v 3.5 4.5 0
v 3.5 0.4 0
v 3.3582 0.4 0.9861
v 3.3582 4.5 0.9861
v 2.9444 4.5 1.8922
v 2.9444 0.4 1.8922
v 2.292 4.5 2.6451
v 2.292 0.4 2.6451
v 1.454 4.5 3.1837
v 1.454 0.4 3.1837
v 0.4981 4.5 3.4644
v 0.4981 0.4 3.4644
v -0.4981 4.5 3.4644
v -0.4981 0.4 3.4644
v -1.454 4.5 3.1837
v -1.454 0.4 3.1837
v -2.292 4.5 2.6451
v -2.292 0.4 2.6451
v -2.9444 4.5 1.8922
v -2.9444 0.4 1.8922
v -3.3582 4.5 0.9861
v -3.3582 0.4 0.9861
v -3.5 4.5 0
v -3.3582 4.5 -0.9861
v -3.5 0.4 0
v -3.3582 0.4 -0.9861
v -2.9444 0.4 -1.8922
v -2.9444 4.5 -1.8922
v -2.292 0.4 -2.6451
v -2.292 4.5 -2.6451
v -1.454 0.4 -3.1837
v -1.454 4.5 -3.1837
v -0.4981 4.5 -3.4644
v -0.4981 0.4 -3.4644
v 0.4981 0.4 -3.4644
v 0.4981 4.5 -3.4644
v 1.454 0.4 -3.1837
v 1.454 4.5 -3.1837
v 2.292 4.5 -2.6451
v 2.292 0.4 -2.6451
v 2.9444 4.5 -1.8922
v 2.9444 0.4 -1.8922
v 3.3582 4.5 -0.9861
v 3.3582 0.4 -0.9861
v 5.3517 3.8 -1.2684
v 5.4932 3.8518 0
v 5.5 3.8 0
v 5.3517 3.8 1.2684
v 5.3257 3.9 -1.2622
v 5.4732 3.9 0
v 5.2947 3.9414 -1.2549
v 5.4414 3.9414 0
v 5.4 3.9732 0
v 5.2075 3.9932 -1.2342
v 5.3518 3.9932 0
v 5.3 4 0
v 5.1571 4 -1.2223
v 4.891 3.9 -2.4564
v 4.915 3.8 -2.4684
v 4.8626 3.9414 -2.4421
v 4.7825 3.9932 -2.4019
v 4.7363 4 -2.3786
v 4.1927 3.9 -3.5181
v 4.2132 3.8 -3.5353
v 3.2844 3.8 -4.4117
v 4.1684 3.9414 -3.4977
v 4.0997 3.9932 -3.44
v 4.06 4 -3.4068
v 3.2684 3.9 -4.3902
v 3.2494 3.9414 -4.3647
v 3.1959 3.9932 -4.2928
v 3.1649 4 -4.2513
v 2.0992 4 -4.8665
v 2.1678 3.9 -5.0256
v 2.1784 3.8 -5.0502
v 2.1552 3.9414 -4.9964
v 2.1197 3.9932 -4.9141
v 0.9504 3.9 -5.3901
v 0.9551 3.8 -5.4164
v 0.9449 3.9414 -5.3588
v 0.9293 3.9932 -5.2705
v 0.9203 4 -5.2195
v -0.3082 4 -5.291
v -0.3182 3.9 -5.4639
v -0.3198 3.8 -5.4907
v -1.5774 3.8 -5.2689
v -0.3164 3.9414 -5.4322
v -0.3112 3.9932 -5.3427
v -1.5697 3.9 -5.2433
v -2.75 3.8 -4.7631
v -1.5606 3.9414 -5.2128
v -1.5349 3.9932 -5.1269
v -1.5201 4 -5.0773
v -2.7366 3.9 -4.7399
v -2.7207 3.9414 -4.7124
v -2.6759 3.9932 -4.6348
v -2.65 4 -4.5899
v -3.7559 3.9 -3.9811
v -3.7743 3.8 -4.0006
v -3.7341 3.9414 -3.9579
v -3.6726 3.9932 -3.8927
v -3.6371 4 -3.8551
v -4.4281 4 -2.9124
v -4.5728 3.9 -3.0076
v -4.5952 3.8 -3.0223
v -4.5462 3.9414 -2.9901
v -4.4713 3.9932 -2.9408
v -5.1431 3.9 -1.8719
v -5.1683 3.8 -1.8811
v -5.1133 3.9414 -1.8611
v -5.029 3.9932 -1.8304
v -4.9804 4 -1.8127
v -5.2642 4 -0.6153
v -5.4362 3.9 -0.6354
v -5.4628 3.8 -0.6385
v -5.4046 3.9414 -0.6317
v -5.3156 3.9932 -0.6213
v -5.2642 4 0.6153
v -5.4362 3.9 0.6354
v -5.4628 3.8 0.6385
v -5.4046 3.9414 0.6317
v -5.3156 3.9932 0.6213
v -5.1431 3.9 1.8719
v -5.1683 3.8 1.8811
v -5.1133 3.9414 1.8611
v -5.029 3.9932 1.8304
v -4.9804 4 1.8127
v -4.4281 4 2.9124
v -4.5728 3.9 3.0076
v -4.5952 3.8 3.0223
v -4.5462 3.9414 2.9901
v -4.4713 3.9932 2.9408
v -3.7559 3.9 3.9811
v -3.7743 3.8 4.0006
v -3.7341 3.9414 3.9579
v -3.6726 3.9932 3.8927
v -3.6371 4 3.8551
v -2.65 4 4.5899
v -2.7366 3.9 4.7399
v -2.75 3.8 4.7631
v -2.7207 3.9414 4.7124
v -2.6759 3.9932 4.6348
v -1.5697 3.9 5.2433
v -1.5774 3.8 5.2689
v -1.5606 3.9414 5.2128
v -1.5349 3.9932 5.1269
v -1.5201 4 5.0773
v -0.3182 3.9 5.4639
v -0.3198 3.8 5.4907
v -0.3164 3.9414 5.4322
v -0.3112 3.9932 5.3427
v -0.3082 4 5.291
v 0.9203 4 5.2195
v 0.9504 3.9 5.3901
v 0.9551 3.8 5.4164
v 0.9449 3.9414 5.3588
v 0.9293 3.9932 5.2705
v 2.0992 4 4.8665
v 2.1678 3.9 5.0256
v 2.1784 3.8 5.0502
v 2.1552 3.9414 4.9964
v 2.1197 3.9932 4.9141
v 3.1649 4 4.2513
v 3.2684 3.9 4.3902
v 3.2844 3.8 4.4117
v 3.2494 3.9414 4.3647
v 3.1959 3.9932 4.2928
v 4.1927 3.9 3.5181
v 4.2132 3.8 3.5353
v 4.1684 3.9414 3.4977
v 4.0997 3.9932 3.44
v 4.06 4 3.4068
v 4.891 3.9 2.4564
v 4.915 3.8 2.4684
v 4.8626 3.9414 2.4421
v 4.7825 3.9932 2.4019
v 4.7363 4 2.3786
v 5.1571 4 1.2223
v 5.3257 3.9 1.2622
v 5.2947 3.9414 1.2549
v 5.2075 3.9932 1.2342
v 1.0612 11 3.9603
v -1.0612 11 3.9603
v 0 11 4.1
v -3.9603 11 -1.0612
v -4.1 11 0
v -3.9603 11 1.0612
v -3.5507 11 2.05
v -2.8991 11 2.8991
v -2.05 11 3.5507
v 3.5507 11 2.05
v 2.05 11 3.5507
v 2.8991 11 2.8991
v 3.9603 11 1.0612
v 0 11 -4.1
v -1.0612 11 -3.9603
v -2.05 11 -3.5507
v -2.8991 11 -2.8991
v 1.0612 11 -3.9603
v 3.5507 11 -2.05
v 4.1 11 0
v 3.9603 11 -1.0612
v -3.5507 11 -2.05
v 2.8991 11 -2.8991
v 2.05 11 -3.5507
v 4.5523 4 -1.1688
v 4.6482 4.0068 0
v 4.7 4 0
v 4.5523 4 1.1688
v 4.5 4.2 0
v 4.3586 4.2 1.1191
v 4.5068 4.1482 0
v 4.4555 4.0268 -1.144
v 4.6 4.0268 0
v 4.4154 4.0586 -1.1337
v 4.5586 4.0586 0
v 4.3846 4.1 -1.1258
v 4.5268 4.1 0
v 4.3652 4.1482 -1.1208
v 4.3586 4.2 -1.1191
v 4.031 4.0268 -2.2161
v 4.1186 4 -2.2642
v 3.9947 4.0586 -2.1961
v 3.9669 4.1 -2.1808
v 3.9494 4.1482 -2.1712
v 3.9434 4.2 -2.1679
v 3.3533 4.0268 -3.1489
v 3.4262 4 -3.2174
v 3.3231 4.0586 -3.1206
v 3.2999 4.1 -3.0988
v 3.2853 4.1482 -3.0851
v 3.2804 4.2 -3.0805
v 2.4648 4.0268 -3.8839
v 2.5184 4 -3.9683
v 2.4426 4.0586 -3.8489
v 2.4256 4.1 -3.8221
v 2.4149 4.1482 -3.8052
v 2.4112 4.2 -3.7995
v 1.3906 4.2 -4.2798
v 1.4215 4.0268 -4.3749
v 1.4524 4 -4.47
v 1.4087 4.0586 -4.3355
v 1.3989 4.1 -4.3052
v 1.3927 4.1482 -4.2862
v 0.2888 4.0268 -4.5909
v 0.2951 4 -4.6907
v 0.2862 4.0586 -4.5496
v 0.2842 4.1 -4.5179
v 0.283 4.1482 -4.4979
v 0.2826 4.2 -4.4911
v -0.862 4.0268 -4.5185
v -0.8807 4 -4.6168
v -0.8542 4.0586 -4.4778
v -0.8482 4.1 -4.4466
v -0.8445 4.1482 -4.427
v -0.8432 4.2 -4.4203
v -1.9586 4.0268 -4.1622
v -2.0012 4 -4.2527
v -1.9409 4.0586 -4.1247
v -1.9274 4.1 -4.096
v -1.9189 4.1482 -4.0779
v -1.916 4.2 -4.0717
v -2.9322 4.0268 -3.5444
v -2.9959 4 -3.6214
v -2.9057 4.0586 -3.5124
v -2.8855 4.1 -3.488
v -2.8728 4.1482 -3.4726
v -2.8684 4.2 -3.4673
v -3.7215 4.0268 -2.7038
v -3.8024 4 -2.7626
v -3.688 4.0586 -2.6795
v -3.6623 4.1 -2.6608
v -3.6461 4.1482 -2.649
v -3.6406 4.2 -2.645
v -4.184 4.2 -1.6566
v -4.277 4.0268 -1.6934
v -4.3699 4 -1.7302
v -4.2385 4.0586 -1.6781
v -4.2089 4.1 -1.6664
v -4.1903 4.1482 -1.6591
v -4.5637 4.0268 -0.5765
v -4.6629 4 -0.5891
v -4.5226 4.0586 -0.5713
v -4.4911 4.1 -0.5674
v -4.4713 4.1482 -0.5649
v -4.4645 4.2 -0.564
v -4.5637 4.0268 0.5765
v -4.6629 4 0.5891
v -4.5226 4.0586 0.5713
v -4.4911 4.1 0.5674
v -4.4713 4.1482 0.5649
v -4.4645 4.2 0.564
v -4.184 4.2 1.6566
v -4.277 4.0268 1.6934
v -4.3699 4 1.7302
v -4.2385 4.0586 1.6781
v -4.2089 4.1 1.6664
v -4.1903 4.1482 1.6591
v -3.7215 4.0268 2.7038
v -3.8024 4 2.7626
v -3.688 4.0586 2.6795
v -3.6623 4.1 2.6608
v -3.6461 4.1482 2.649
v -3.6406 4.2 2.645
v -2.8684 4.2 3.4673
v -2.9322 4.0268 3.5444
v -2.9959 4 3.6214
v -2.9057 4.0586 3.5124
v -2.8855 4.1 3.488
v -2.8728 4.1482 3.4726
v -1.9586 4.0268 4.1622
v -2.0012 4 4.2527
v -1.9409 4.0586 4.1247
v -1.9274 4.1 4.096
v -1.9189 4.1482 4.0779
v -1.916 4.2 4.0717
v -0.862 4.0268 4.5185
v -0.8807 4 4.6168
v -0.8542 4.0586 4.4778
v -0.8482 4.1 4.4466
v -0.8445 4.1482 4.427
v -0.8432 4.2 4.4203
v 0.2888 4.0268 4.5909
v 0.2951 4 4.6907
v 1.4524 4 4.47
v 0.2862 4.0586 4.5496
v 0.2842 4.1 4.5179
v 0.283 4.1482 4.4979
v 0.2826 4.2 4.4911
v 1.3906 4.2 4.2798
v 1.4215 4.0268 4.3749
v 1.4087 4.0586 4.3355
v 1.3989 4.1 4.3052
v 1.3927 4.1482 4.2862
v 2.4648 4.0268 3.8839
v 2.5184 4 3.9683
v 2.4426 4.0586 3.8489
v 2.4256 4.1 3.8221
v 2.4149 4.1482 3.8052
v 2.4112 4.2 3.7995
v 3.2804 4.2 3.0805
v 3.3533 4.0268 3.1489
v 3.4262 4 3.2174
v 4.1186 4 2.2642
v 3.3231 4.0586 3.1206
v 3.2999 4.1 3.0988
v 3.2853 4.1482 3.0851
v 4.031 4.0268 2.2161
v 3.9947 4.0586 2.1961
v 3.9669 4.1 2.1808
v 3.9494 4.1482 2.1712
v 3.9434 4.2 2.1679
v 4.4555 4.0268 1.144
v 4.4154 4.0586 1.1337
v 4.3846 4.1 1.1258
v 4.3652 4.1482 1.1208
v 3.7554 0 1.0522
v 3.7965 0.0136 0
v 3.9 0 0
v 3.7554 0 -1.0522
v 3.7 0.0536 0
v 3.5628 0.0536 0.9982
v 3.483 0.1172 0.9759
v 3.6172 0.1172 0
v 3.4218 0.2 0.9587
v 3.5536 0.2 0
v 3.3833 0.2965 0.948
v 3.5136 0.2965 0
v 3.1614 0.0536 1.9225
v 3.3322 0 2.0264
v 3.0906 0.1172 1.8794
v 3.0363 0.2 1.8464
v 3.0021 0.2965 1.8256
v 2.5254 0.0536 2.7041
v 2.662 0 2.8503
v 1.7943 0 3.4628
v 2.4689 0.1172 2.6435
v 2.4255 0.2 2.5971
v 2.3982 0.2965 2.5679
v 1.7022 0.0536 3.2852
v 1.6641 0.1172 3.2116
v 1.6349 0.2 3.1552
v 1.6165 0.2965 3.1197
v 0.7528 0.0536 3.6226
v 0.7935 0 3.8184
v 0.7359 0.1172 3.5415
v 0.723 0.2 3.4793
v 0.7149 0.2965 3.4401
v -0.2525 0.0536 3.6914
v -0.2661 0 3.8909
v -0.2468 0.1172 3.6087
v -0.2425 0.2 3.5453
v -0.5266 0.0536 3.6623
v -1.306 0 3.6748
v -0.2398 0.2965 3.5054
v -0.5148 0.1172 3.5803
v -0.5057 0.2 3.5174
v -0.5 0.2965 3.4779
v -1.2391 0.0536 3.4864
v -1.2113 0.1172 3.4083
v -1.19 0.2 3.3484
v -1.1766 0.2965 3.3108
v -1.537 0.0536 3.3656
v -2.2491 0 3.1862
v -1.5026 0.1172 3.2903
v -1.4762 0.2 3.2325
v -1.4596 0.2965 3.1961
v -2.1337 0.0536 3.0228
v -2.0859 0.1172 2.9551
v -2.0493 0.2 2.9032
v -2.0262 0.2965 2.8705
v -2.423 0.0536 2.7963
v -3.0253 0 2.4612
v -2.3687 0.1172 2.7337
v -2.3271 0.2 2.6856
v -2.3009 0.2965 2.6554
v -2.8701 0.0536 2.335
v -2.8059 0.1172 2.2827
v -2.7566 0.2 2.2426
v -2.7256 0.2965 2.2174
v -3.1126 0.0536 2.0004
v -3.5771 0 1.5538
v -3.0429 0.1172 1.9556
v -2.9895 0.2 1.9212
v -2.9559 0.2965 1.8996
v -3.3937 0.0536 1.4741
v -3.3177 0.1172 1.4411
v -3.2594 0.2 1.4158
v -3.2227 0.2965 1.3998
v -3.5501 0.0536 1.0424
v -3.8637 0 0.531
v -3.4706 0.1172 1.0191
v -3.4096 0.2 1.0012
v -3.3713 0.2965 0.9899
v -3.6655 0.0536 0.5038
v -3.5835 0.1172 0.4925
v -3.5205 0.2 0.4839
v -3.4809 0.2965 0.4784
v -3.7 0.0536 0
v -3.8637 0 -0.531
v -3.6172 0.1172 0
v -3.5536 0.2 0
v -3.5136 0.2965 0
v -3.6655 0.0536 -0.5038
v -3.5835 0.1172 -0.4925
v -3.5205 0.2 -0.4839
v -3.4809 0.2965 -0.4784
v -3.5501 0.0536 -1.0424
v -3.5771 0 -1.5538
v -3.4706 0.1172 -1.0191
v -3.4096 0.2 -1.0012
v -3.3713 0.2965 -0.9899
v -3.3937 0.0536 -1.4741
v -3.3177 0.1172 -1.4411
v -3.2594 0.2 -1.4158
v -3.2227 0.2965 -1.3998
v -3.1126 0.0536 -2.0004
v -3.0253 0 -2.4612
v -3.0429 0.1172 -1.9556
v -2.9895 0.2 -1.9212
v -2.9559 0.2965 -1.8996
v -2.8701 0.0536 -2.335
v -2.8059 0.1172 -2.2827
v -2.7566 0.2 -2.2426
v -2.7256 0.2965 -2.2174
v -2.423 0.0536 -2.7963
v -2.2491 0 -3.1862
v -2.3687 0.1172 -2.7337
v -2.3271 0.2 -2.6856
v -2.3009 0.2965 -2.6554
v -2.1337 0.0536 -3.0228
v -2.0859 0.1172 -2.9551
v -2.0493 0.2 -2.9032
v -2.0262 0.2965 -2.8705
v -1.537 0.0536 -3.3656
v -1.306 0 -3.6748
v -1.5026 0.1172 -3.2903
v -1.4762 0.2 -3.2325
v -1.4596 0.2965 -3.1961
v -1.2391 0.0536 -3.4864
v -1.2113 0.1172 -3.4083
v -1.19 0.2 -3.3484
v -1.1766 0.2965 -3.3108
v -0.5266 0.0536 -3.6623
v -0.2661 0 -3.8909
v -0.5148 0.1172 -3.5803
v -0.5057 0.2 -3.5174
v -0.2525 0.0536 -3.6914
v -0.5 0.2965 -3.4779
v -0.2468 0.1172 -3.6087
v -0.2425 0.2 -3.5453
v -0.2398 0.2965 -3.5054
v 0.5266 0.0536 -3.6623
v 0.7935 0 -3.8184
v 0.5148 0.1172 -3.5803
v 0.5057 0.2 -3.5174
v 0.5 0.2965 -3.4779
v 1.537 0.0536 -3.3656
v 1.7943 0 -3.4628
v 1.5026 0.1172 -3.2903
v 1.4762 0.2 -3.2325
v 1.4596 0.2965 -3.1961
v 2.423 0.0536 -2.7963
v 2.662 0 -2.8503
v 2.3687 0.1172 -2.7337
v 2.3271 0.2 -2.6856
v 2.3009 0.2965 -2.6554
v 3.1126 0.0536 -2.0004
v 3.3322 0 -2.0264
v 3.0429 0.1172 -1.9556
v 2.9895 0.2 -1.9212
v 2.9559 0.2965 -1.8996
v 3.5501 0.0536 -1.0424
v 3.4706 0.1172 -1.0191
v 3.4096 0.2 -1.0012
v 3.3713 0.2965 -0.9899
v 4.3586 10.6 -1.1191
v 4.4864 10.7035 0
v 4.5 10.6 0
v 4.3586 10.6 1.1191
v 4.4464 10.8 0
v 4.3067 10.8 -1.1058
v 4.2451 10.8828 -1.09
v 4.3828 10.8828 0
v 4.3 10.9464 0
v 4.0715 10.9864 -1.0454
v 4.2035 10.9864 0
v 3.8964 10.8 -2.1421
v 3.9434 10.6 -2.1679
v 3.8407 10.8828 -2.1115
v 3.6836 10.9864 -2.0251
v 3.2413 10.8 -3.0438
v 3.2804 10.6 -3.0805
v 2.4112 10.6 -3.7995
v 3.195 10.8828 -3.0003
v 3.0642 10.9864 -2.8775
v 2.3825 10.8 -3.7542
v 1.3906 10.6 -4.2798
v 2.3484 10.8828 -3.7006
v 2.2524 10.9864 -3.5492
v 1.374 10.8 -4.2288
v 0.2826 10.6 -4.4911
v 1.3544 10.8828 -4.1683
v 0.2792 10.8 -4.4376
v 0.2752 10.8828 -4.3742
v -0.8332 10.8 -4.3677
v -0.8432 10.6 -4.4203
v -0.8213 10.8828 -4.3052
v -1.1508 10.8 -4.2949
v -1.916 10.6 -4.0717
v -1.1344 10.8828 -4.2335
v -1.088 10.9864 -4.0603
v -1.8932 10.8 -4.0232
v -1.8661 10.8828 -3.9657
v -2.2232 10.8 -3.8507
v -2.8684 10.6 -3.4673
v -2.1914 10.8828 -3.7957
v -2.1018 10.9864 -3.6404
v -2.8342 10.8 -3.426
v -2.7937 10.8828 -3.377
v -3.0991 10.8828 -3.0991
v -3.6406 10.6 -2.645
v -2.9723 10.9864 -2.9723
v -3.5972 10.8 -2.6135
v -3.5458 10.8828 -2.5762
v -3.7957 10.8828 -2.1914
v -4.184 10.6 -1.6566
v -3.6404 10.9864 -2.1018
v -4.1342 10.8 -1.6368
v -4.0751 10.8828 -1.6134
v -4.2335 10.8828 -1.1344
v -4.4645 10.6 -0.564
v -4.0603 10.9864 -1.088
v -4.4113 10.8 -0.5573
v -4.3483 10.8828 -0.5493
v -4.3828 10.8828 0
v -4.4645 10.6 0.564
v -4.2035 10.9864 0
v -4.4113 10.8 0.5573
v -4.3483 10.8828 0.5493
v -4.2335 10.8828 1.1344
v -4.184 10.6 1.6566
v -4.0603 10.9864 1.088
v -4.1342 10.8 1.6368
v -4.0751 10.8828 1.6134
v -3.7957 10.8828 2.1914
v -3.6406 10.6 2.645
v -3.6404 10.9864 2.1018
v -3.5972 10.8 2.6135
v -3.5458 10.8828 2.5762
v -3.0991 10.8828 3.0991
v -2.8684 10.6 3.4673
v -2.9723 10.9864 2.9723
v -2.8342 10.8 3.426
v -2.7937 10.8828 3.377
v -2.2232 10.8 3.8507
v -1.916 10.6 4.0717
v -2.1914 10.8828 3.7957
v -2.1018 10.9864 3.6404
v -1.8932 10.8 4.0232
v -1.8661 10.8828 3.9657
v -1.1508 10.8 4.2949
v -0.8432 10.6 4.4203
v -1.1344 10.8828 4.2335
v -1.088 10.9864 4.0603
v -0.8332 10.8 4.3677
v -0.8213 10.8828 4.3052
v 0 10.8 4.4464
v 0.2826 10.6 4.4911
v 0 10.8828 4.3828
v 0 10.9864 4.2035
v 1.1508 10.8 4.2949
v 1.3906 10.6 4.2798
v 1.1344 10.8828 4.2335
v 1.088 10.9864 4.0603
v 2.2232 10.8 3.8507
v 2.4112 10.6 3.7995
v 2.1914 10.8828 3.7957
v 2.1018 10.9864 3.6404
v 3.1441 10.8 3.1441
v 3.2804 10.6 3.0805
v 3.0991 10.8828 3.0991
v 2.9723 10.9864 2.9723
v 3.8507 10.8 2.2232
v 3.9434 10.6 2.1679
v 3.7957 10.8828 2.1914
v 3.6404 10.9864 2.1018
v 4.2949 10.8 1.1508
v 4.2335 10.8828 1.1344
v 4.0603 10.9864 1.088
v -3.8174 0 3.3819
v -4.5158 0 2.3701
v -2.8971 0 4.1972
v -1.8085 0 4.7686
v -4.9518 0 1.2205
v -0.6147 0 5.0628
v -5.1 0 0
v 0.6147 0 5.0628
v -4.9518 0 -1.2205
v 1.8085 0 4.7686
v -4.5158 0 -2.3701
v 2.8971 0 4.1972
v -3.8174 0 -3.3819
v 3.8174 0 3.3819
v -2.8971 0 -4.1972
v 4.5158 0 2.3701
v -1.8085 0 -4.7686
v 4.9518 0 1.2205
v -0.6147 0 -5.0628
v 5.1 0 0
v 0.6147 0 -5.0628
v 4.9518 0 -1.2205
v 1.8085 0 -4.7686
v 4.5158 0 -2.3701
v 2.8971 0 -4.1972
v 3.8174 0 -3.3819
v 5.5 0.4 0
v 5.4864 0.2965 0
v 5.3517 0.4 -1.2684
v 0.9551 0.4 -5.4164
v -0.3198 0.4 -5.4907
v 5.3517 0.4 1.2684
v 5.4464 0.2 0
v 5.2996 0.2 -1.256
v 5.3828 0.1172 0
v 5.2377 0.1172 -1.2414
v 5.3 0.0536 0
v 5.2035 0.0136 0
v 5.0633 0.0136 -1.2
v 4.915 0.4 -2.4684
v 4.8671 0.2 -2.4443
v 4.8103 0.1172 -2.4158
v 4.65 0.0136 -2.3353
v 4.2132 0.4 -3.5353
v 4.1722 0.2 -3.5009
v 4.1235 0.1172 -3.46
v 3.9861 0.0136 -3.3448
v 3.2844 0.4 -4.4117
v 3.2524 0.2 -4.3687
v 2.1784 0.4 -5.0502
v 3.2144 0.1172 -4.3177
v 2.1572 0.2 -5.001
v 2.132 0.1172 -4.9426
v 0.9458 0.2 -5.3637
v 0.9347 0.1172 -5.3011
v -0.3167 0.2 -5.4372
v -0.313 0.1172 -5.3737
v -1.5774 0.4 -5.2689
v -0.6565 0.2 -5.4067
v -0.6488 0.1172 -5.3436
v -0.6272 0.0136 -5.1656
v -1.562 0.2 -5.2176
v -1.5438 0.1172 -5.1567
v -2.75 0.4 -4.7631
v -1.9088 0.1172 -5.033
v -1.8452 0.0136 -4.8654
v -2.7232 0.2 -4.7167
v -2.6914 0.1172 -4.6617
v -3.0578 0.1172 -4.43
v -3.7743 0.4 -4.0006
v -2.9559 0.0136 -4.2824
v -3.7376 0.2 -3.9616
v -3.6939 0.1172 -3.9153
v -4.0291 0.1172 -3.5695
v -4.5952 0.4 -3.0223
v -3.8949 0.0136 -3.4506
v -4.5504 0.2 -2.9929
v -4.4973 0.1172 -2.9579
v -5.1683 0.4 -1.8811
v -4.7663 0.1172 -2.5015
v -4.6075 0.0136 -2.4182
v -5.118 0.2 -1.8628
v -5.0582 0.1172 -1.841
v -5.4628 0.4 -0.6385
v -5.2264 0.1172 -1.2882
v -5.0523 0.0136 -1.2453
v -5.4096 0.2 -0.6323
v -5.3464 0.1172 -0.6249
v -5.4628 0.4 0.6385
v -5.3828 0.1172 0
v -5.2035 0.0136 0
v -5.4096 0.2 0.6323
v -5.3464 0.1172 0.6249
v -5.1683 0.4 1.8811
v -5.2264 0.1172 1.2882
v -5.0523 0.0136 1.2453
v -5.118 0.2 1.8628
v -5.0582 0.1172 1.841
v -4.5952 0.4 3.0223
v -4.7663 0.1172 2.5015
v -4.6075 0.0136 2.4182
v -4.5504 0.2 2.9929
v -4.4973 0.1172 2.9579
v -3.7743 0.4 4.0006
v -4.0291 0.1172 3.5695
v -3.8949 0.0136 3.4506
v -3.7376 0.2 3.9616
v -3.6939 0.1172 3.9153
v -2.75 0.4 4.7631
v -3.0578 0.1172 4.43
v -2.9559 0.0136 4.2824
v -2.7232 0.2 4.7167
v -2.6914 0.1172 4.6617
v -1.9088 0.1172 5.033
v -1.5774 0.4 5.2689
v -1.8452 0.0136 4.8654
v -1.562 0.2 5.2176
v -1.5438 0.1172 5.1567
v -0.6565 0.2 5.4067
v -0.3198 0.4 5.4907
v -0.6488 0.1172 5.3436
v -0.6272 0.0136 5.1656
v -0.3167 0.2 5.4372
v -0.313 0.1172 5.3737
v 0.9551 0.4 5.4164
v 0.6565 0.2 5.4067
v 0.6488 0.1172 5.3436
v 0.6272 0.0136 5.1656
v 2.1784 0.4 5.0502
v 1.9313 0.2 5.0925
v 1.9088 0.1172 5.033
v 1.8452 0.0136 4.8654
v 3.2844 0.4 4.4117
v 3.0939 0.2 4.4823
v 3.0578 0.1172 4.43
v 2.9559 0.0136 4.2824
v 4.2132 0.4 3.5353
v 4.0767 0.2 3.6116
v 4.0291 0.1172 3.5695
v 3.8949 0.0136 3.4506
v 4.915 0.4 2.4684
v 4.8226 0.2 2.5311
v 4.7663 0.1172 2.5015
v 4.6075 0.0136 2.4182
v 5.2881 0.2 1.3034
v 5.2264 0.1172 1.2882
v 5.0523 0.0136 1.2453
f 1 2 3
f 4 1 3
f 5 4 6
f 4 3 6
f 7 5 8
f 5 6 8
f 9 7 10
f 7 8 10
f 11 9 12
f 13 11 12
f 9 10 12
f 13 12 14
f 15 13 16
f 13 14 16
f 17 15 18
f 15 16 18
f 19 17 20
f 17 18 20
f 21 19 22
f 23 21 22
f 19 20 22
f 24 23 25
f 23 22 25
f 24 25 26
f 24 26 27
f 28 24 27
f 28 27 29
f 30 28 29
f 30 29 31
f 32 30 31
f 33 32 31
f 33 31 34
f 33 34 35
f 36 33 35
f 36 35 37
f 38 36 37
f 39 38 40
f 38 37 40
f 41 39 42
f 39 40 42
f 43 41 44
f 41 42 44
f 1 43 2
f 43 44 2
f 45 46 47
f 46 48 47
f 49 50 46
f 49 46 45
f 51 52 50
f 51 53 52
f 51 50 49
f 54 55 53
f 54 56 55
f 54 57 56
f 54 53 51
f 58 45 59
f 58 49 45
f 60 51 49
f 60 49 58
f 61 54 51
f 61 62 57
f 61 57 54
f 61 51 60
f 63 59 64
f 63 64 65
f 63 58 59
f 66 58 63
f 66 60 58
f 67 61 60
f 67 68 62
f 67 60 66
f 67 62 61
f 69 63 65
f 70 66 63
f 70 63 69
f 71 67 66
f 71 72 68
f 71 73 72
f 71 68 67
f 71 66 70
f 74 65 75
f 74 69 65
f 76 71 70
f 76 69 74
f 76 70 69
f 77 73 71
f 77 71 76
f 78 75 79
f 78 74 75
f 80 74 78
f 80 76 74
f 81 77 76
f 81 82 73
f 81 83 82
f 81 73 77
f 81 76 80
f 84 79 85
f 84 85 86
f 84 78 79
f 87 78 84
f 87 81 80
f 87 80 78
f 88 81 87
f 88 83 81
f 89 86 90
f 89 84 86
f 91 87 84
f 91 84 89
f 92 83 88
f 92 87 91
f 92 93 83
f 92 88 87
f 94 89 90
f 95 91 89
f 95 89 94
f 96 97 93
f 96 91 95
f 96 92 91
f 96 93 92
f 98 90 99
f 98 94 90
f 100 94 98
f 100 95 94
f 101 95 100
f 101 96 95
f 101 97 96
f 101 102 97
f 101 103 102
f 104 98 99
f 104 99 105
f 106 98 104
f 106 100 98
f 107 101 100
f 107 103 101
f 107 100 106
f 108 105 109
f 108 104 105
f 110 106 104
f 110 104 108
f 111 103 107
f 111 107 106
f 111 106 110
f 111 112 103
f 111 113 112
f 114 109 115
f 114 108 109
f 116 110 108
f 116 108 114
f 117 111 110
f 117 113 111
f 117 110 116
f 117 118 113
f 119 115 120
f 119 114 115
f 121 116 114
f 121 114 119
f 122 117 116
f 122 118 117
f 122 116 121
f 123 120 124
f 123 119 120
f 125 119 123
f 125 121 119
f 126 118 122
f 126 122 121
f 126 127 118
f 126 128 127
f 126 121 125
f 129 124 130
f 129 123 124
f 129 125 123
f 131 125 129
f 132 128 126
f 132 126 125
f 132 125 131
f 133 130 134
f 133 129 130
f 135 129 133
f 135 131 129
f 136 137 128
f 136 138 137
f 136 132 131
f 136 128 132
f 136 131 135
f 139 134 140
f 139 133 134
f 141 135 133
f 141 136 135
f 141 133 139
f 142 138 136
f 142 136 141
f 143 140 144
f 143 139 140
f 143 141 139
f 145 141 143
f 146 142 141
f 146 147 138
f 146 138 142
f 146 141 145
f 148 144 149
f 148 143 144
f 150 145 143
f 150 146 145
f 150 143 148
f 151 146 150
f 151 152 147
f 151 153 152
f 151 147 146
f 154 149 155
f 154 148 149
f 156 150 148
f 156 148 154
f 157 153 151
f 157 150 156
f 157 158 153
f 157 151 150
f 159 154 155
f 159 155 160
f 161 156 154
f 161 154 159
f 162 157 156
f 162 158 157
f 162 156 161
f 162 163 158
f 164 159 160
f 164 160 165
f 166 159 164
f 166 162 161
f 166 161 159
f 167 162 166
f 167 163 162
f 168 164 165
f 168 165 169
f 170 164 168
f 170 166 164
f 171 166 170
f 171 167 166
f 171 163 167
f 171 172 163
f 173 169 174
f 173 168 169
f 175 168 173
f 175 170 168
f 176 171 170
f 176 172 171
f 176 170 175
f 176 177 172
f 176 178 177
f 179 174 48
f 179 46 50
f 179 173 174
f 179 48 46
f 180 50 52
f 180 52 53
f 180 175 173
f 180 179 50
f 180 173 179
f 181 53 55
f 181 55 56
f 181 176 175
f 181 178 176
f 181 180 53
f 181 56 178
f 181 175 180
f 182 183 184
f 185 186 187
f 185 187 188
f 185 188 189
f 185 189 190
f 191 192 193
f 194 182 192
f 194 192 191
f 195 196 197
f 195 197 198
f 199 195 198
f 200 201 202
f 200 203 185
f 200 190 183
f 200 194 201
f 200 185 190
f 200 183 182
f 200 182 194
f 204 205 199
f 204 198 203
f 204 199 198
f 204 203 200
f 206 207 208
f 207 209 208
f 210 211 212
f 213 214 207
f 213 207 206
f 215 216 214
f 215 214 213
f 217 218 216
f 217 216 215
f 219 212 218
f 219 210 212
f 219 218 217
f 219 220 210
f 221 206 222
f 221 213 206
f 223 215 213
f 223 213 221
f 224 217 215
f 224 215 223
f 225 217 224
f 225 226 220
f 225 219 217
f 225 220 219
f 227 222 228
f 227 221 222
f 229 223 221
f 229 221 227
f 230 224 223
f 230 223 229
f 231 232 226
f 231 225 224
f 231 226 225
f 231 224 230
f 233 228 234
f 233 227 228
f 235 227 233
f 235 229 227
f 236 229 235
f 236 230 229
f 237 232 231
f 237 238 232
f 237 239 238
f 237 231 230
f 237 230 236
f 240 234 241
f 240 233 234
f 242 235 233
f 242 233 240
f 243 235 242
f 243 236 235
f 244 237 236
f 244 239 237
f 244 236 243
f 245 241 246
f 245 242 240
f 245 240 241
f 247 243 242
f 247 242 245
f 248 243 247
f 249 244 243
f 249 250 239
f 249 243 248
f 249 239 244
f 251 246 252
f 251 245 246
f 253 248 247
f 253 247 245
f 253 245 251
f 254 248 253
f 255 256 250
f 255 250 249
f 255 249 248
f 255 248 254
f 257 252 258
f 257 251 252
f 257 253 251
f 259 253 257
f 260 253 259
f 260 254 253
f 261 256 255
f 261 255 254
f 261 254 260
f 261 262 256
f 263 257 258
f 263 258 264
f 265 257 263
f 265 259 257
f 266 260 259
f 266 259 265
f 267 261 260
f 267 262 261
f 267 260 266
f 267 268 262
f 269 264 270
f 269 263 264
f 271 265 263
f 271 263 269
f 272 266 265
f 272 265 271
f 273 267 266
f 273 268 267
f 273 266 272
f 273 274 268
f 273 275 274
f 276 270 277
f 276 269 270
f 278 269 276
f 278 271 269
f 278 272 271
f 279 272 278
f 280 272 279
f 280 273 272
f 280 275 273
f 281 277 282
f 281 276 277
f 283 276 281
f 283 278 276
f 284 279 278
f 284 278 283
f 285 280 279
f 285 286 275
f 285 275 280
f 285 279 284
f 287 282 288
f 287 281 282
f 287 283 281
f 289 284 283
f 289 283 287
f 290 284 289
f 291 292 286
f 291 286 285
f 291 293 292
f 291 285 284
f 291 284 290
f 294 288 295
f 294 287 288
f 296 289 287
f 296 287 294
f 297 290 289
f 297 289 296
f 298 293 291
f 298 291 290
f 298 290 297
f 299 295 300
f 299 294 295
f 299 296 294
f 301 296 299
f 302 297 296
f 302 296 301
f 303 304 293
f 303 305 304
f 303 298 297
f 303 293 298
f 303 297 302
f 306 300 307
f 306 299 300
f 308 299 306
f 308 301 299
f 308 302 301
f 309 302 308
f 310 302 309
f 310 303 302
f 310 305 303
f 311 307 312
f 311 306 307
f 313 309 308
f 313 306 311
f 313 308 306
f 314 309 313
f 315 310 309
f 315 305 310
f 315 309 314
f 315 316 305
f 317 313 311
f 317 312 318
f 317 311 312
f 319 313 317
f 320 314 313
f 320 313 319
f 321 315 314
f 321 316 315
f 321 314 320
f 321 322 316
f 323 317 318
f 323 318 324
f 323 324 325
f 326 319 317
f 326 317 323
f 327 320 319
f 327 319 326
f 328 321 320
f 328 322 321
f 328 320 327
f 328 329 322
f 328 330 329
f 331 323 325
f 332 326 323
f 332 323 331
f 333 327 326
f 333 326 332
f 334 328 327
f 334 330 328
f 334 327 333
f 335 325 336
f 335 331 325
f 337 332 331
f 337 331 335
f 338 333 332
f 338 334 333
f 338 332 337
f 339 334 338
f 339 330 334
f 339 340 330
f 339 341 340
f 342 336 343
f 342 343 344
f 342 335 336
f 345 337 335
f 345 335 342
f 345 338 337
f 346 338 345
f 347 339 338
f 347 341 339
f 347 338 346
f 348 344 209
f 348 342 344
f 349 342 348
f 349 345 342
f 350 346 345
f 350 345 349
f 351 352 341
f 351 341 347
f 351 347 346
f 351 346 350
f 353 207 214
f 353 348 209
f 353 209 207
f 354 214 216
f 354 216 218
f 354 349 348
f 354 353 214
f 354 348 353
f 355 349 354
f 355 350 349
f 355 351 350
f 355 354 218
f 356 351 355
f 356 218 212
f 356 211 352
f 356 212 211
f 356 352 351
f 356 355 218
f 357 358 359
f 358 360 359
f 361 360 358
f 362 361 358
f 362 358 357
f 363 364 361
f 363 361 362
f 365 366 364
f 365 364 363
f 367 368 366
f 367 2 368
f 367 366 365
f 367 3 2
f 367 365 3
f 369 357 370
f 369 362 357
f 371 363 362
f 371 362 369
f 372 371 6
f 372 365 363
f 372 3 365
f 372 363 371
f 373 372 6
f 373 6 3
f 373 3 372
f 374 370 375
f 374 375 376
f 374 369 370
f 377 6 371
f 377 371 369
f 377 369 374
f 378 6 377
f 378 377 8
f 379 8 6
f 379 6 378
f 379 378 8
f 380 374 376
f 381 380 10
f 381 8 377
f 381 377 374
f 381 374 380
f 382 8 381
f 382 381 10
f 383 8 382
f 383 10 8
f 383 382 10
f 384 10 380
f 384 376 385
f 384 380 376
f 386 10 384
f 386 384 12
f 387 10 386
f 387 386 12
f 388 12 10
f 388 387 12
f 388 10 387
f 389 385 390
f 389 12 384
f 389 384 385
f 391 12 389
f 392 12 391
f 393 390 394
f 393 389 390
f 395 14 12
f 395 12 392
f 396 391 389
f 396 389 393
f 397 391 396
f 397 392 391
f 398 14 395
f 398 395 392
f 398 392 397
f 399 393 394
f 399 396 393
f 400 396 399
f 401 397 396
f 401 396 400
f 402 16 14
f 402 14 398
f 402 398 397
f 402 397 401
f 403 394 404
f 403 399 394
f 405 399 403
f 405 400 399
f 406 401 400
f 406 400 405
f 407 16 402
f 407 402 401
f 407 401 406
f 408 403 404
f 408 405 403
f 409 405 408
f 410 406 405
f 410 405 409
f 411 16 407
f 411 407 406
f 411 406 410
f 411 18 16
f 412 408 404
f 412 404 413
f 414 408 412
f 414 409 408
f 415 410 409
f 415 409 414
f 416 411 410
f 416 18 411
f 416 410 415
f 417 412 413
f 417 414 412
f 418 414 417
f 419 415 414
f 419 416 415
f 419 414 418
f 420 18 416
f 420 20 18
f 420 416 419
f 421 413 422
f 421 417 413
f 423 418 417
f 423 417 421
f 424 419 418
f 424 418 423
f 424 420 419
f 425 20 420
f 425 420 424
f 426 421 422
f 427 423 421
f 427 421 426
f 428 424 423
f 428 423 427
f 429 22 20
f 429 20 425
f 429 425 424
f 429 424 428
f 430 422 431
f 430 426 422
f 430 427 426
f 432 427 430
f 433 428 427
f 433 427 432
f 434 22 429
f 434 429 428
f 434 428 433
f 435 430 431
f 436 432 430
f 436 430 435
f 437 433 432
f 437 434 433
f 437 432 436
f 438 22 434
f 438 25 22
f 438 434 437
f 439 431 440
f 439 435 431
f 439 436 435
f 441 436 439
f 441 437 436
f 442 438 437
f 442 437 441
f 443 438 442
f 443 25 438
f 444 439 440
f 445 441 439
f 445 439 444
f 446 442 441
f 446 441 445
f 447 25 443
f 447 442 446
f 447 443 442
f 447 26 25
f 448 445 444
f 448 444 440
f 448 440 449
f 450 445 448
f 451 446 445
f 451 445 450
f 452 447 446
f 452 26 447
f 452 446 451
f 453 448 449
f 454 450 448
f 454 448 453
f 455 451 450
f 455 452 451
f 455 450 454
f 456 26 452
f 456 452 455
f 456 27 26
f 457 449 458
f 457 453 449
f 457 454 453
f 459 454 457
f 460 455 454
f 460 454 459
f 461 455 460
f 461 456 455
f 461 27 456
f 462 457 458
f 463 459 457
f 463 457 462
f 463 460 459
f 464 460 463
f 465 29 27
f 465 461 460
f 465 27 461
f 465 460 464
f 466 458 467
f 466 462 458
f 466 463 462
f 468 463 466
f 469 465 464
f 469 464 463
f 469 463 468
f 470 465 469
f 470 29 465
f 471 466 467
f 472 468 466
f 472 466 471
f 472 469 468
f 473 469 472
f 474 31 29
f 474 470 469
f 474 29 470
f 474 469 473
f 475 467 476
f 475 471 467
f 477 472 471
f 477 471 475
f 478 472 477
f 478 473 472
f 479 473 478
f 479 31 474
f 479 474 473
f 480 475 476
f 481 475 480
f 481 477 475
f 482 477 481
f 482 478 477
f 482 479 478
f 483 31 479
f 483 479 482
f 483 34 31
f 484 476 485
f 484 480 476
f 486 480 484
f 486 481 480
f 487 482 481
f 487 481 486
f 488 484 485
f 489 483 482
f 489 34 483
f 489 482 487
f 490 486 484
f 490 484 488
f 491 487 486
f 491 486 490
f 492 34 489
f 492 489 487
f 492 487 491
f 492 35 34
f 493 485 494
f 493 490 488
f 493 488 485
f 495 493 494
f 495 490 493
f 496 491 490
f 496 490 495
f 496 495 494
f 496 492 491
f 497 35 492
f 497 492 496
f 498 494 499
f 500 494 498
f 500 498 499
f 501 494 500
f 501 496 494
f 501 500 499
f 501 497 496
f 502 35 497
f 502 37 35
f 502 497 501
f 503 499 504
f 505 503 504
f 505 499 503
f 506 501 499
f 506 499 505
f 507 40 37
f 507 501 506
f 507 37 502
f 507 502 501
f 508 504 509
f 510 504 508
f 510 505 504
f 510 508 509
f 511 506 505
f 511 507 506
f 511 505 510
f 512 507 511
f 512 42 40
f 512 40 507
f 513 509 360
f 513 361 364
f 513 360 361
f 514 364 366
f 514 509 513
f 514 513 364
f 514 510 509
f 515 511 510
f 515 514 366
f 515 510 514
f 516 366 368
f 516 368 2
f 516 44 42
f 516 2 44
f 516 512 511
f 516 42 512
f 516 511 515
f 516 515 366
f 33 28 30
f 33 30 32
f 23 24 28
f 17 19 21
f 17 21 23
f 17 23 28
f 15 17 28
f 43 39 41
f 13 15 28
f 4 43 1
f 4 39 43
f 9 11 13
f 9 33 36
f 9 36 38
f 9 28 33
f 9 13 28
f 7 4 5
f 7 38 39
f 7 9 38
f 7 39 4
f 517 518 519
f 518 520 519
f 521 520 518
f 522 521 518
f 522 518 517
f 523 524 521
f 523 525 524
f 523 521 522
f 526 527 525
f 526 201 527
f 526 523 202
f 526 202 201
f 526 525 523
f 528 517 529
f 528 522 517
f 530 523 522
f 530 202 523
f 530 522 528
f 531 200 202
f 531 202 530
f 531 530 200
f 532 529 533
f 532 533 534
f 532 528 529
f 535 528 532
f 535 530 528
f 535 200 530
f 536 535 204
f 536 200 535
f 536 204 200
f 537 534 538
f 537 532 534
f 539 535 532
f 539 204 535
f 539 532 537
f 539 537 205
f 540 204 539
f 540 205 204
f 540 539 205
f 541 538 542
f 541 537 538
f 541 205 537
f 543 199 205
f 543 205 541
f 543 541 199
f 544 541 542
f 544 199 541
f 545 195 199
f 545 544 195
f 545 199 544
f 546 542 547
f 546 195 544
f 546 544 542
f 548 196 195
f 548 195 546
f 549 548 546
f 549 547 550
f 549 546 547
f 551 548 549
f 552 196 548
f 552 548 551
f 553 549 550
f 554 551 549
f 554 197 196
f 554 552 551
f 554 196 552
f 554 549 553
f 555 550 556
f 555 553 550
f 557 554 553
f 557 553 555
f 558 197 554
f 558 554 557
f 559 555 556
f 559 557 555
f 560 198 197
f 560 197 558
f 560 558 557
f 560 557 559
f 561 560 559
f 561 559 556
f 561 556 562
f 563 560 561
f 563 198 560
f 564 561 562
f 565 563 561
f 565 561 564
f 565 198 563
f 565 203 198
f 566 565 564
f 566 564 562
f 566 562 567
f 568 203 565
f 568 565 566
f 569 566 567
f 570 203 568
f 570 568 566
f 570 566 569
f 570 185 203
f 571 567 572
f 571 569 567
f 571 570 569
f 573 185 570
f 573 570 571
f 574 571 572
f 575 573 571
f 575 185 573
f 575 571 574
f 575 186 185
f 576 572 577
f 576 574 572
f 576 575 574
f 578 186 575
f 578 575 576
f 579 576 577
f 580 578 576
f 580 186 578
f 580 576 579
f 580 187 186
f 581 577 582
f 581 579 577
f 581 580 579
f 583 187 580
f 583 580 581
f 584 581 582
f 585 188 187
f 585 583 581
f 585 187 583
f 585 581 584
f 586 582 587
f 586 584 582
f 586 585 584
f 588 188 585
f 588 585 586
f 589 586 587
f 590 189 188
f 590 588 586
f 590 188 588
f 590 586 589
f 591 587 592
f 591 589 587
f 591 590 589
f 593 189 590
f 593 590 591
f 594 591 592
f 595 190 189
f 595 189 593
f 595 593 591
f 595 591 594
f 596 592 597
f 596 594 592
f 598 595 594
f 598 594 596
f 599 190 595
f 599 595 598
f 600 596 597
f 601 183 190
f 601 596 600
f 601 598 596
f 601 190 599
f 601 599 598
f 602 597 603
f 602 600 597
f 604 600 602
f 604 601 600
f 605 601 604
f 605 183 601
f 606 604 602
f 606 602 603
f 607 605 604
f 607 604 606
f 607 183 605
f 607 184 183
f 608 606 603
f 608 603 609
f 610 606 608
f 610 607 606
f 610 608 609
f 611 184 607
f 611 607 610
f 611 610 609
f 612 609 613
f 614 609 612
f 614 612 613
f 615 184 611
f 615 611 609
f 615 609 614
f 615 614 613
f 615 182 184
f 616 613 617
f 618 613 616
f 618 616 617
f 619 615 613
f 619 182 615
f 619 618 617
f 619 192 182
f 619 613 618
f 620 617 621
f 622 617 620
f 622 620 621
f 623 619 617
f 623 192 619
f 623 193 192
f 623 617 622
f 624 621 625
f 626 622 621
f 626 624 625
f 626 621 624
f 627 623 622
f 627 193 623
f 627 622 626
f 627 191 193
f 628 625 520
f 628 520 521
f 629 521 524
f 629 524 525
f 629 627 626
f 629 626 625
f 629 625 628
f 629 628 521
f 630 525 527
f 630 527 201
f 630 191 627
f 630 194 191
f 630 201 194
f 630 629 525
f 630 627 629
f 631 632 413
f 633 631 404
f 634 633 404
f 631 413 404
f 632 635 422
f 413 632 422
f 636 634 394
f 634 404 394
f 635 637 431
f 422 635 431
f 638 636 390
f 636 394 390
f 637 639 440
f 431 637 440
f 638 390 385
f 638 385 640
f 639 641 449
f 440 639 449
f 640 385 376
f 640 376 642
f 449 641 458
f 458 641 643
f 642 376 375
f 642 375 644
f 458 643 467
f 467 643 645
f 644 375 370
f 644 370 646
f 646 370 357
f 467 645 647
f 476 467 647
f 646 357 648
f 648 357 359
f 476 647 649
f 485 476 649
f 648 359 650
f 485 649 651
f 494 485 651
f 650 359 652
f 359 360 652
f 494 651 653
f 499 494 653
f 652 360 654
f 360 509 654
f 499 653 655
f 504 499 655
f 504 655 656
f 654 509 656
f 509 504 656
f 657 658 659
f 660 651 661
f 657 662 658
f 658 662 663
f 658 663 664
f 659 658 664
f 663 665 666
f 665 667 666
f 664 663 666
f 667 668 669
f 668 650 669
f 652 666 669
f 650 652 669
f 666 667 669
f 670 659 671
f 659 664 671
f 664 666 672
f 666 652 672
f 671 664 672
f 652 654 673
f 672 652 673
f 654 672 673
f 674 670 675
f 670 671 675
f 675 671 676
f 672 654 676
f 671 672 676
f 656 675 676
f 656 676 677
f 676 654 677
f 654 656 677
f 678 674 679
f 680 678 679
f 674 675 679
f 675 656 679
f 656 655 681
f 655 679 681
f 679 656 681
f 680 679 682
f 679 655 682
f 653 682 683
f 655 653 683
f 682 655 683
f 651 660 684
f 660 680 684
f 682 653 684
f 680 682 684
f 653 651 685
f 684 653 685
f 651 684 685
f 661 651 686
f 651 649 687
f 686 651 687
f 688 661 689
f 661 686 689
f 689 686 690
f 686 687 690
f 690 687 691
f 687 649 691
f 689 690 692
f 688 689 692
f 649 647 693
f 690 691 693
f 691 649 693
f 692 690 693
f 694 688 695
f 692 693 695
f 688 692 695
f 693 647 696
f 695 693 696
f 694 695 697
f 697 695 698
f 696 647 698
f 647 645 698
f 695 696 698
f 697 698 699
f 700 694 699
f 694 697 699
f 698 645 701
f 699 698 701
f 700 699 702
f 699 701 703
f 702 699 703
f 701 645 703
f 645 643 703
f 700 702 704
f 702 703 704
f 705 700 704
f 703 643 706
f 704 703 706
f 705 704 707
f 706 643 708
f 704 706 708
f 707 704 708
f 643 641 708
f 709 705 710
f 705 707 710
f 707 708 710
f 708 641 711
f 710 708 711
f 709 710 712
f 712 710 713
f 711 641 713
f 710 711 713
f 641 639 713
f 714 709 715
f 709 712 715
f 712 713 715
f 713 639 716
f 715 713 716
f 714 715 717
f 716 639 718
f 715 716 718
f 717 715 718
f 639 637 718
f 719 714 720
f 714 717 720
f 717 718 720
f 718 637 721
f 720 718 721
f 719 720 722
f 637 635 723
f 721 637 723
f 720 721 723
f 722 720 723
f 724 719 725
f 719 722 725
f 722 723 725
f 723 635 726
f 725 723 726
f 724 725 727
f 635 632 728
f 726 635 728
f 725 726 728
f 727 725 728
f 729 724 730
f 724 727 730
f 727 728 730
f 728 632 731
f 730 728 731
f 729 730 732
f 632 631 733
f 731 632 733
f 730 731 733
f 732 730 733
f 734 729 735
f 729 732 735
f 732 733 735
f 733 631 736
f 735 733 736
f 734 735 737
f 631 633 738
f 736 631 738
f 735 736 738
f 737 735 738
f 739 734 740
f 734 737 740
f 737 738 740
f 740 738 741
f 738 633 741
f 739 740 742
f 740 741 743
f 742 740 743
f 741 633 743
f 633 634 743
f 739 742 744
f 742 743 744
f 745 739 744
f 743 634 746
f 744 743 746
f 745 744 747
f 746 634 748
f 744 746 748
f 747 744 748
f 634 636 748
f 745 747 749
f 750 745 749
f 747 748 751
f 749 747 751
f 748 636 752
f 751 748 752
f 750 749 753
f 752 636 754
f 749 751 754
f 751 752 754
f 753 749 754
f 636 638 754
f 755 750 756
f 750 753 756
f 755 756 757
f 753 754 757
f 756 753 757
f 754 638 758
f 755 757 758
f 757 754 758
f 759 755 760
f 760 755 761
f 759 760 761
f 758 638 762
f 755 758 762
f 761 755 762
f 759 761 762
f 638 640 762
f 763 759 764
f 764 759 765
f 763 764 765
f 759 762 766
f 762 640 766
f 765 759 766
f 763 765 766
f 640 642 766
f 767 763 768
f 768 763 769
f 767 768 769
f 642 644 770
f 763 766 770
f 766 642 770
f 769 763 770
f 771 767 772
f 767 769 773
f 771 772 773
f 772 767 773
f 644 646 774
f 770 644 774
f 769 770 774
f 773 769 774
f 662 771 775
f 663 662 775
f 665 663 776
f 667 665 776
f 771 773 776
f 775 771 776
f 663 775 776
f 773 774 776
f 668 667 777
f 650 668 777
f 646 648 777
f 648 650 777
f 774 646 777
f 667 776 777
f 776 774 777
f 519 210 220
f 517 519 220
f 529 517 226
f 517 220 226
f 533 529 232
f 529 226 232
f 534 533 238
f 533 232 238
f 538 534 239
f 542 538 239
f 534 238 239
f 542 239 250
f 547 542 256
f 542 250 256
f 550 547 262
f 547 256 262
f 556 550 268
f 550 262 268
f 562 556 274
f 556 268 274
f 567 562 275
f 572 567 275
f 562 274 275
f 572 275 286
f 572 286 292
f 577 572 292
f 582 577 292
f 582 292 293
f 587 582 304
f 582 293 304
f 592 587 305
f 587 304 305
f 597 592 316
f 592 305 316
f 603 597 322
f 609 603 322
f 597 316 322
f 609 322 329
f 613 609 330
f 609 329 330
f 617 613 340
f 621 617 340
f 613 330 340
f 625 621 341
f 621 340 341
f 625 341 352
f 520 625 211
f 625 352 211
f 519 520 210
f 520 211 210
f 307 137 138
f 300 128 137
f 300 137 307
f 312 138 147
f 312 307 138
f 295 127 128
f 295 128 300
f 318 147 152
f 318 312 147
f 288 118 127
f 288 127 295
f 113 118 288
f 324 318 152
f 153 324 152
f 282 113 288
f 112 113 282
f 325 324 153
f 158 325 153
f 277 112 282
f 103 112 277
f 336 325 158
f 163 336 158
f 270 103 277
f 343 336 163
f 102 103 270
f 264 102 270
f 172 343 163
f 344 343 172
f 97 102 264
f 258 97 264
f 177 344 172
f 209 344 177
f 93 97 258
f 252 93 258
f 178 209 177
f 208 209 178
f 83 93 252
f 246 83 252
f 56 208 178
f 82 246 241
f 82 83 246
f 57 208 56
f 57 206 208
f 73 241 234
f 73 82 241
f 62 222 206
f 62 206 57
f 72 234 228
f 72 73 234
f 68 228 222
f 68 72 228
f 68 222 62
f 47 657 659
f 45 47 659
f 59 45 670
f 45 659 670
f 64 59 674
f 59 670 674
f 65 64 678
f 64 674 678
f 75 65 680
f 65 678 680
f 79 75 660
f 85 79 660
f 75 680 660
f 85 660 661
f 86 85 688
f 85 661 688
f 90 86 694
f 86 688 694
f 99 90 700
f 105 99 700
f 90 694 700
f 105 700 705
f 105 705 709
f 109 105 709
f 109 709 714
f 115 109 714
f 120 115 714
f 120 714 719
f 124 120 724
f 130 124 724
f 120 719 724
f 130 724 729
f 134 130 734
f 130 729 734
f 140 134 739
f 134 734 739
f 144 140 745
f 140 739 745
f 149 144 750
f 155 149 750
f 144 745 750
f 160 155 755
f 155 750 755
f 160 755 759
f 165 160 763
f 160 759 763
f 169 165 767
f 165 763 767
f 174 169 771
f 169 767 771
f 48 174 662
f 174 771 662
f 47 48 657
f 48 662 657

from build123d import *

# Parameters (mm, degrees)
SKETCH_2_R          = 5.5
EXTRUDE_1_DEPTH     = 4
SKETCH_3_R          = 4.5
EXTRUDE_2_DEPTH     = 7
SKETCH_4_R          = 3.5
CUT_EXTRUDE_1_DEPTH = 4.5
FILLET_1_R          = 0.4
FILLET_2_R          = 0.2


with BuildPart() as part:
    # 草图2 → 凸台-拉伸1 (new body)
    with BuildSketch(Plane(origin=(0, 0, 0), x_dir=(1, 0, 0), z_dir=(0, 1, 0))):
        Circle(SKETCH_2_R)
    extrude(amount=EXTRUDE_1_DEPTH)

    # 草图3 → 凸台-拉伸2 (add)
    with BuildSketch(Plane(origin=(0, 4, 0), x_dir=(1, 0, 0), z_dir=(0, 1, 0))):
        Circle(SKETCH_3_R)
    extrude(amount=EXTRUDE_2_DEPTH)

    # 草图4 → 切除-拉伸1 (cut)
    with BuildSketch(Plane.XZ):
        Circle(SKETCH_4_R)
    extrude(amount=-CUT_EXTRUDE_1_DEPTH, mode=Mode.SUBTRACT)

    # 圆角1
    fillet_1_edges = [part.edges().sort_by_distance(p)[0] for p in [
        (-3.5, 0, 0),
        (-5.5, 0, 0),
        (-4.5, 11, 0),
    ]]
    fillet(fillet_1_edges, radius=FILLET_1_R)

    # 圆角2
    fillet_2_edges = [part.edges().sort_by_distance(p)[0] for p in [
        (-5.5, 4, 0),
        (-4.5, 4, 0),
    ]]
    fillet(fillet_2_edges, radius=FILLET_2_R)


solid = part.part
